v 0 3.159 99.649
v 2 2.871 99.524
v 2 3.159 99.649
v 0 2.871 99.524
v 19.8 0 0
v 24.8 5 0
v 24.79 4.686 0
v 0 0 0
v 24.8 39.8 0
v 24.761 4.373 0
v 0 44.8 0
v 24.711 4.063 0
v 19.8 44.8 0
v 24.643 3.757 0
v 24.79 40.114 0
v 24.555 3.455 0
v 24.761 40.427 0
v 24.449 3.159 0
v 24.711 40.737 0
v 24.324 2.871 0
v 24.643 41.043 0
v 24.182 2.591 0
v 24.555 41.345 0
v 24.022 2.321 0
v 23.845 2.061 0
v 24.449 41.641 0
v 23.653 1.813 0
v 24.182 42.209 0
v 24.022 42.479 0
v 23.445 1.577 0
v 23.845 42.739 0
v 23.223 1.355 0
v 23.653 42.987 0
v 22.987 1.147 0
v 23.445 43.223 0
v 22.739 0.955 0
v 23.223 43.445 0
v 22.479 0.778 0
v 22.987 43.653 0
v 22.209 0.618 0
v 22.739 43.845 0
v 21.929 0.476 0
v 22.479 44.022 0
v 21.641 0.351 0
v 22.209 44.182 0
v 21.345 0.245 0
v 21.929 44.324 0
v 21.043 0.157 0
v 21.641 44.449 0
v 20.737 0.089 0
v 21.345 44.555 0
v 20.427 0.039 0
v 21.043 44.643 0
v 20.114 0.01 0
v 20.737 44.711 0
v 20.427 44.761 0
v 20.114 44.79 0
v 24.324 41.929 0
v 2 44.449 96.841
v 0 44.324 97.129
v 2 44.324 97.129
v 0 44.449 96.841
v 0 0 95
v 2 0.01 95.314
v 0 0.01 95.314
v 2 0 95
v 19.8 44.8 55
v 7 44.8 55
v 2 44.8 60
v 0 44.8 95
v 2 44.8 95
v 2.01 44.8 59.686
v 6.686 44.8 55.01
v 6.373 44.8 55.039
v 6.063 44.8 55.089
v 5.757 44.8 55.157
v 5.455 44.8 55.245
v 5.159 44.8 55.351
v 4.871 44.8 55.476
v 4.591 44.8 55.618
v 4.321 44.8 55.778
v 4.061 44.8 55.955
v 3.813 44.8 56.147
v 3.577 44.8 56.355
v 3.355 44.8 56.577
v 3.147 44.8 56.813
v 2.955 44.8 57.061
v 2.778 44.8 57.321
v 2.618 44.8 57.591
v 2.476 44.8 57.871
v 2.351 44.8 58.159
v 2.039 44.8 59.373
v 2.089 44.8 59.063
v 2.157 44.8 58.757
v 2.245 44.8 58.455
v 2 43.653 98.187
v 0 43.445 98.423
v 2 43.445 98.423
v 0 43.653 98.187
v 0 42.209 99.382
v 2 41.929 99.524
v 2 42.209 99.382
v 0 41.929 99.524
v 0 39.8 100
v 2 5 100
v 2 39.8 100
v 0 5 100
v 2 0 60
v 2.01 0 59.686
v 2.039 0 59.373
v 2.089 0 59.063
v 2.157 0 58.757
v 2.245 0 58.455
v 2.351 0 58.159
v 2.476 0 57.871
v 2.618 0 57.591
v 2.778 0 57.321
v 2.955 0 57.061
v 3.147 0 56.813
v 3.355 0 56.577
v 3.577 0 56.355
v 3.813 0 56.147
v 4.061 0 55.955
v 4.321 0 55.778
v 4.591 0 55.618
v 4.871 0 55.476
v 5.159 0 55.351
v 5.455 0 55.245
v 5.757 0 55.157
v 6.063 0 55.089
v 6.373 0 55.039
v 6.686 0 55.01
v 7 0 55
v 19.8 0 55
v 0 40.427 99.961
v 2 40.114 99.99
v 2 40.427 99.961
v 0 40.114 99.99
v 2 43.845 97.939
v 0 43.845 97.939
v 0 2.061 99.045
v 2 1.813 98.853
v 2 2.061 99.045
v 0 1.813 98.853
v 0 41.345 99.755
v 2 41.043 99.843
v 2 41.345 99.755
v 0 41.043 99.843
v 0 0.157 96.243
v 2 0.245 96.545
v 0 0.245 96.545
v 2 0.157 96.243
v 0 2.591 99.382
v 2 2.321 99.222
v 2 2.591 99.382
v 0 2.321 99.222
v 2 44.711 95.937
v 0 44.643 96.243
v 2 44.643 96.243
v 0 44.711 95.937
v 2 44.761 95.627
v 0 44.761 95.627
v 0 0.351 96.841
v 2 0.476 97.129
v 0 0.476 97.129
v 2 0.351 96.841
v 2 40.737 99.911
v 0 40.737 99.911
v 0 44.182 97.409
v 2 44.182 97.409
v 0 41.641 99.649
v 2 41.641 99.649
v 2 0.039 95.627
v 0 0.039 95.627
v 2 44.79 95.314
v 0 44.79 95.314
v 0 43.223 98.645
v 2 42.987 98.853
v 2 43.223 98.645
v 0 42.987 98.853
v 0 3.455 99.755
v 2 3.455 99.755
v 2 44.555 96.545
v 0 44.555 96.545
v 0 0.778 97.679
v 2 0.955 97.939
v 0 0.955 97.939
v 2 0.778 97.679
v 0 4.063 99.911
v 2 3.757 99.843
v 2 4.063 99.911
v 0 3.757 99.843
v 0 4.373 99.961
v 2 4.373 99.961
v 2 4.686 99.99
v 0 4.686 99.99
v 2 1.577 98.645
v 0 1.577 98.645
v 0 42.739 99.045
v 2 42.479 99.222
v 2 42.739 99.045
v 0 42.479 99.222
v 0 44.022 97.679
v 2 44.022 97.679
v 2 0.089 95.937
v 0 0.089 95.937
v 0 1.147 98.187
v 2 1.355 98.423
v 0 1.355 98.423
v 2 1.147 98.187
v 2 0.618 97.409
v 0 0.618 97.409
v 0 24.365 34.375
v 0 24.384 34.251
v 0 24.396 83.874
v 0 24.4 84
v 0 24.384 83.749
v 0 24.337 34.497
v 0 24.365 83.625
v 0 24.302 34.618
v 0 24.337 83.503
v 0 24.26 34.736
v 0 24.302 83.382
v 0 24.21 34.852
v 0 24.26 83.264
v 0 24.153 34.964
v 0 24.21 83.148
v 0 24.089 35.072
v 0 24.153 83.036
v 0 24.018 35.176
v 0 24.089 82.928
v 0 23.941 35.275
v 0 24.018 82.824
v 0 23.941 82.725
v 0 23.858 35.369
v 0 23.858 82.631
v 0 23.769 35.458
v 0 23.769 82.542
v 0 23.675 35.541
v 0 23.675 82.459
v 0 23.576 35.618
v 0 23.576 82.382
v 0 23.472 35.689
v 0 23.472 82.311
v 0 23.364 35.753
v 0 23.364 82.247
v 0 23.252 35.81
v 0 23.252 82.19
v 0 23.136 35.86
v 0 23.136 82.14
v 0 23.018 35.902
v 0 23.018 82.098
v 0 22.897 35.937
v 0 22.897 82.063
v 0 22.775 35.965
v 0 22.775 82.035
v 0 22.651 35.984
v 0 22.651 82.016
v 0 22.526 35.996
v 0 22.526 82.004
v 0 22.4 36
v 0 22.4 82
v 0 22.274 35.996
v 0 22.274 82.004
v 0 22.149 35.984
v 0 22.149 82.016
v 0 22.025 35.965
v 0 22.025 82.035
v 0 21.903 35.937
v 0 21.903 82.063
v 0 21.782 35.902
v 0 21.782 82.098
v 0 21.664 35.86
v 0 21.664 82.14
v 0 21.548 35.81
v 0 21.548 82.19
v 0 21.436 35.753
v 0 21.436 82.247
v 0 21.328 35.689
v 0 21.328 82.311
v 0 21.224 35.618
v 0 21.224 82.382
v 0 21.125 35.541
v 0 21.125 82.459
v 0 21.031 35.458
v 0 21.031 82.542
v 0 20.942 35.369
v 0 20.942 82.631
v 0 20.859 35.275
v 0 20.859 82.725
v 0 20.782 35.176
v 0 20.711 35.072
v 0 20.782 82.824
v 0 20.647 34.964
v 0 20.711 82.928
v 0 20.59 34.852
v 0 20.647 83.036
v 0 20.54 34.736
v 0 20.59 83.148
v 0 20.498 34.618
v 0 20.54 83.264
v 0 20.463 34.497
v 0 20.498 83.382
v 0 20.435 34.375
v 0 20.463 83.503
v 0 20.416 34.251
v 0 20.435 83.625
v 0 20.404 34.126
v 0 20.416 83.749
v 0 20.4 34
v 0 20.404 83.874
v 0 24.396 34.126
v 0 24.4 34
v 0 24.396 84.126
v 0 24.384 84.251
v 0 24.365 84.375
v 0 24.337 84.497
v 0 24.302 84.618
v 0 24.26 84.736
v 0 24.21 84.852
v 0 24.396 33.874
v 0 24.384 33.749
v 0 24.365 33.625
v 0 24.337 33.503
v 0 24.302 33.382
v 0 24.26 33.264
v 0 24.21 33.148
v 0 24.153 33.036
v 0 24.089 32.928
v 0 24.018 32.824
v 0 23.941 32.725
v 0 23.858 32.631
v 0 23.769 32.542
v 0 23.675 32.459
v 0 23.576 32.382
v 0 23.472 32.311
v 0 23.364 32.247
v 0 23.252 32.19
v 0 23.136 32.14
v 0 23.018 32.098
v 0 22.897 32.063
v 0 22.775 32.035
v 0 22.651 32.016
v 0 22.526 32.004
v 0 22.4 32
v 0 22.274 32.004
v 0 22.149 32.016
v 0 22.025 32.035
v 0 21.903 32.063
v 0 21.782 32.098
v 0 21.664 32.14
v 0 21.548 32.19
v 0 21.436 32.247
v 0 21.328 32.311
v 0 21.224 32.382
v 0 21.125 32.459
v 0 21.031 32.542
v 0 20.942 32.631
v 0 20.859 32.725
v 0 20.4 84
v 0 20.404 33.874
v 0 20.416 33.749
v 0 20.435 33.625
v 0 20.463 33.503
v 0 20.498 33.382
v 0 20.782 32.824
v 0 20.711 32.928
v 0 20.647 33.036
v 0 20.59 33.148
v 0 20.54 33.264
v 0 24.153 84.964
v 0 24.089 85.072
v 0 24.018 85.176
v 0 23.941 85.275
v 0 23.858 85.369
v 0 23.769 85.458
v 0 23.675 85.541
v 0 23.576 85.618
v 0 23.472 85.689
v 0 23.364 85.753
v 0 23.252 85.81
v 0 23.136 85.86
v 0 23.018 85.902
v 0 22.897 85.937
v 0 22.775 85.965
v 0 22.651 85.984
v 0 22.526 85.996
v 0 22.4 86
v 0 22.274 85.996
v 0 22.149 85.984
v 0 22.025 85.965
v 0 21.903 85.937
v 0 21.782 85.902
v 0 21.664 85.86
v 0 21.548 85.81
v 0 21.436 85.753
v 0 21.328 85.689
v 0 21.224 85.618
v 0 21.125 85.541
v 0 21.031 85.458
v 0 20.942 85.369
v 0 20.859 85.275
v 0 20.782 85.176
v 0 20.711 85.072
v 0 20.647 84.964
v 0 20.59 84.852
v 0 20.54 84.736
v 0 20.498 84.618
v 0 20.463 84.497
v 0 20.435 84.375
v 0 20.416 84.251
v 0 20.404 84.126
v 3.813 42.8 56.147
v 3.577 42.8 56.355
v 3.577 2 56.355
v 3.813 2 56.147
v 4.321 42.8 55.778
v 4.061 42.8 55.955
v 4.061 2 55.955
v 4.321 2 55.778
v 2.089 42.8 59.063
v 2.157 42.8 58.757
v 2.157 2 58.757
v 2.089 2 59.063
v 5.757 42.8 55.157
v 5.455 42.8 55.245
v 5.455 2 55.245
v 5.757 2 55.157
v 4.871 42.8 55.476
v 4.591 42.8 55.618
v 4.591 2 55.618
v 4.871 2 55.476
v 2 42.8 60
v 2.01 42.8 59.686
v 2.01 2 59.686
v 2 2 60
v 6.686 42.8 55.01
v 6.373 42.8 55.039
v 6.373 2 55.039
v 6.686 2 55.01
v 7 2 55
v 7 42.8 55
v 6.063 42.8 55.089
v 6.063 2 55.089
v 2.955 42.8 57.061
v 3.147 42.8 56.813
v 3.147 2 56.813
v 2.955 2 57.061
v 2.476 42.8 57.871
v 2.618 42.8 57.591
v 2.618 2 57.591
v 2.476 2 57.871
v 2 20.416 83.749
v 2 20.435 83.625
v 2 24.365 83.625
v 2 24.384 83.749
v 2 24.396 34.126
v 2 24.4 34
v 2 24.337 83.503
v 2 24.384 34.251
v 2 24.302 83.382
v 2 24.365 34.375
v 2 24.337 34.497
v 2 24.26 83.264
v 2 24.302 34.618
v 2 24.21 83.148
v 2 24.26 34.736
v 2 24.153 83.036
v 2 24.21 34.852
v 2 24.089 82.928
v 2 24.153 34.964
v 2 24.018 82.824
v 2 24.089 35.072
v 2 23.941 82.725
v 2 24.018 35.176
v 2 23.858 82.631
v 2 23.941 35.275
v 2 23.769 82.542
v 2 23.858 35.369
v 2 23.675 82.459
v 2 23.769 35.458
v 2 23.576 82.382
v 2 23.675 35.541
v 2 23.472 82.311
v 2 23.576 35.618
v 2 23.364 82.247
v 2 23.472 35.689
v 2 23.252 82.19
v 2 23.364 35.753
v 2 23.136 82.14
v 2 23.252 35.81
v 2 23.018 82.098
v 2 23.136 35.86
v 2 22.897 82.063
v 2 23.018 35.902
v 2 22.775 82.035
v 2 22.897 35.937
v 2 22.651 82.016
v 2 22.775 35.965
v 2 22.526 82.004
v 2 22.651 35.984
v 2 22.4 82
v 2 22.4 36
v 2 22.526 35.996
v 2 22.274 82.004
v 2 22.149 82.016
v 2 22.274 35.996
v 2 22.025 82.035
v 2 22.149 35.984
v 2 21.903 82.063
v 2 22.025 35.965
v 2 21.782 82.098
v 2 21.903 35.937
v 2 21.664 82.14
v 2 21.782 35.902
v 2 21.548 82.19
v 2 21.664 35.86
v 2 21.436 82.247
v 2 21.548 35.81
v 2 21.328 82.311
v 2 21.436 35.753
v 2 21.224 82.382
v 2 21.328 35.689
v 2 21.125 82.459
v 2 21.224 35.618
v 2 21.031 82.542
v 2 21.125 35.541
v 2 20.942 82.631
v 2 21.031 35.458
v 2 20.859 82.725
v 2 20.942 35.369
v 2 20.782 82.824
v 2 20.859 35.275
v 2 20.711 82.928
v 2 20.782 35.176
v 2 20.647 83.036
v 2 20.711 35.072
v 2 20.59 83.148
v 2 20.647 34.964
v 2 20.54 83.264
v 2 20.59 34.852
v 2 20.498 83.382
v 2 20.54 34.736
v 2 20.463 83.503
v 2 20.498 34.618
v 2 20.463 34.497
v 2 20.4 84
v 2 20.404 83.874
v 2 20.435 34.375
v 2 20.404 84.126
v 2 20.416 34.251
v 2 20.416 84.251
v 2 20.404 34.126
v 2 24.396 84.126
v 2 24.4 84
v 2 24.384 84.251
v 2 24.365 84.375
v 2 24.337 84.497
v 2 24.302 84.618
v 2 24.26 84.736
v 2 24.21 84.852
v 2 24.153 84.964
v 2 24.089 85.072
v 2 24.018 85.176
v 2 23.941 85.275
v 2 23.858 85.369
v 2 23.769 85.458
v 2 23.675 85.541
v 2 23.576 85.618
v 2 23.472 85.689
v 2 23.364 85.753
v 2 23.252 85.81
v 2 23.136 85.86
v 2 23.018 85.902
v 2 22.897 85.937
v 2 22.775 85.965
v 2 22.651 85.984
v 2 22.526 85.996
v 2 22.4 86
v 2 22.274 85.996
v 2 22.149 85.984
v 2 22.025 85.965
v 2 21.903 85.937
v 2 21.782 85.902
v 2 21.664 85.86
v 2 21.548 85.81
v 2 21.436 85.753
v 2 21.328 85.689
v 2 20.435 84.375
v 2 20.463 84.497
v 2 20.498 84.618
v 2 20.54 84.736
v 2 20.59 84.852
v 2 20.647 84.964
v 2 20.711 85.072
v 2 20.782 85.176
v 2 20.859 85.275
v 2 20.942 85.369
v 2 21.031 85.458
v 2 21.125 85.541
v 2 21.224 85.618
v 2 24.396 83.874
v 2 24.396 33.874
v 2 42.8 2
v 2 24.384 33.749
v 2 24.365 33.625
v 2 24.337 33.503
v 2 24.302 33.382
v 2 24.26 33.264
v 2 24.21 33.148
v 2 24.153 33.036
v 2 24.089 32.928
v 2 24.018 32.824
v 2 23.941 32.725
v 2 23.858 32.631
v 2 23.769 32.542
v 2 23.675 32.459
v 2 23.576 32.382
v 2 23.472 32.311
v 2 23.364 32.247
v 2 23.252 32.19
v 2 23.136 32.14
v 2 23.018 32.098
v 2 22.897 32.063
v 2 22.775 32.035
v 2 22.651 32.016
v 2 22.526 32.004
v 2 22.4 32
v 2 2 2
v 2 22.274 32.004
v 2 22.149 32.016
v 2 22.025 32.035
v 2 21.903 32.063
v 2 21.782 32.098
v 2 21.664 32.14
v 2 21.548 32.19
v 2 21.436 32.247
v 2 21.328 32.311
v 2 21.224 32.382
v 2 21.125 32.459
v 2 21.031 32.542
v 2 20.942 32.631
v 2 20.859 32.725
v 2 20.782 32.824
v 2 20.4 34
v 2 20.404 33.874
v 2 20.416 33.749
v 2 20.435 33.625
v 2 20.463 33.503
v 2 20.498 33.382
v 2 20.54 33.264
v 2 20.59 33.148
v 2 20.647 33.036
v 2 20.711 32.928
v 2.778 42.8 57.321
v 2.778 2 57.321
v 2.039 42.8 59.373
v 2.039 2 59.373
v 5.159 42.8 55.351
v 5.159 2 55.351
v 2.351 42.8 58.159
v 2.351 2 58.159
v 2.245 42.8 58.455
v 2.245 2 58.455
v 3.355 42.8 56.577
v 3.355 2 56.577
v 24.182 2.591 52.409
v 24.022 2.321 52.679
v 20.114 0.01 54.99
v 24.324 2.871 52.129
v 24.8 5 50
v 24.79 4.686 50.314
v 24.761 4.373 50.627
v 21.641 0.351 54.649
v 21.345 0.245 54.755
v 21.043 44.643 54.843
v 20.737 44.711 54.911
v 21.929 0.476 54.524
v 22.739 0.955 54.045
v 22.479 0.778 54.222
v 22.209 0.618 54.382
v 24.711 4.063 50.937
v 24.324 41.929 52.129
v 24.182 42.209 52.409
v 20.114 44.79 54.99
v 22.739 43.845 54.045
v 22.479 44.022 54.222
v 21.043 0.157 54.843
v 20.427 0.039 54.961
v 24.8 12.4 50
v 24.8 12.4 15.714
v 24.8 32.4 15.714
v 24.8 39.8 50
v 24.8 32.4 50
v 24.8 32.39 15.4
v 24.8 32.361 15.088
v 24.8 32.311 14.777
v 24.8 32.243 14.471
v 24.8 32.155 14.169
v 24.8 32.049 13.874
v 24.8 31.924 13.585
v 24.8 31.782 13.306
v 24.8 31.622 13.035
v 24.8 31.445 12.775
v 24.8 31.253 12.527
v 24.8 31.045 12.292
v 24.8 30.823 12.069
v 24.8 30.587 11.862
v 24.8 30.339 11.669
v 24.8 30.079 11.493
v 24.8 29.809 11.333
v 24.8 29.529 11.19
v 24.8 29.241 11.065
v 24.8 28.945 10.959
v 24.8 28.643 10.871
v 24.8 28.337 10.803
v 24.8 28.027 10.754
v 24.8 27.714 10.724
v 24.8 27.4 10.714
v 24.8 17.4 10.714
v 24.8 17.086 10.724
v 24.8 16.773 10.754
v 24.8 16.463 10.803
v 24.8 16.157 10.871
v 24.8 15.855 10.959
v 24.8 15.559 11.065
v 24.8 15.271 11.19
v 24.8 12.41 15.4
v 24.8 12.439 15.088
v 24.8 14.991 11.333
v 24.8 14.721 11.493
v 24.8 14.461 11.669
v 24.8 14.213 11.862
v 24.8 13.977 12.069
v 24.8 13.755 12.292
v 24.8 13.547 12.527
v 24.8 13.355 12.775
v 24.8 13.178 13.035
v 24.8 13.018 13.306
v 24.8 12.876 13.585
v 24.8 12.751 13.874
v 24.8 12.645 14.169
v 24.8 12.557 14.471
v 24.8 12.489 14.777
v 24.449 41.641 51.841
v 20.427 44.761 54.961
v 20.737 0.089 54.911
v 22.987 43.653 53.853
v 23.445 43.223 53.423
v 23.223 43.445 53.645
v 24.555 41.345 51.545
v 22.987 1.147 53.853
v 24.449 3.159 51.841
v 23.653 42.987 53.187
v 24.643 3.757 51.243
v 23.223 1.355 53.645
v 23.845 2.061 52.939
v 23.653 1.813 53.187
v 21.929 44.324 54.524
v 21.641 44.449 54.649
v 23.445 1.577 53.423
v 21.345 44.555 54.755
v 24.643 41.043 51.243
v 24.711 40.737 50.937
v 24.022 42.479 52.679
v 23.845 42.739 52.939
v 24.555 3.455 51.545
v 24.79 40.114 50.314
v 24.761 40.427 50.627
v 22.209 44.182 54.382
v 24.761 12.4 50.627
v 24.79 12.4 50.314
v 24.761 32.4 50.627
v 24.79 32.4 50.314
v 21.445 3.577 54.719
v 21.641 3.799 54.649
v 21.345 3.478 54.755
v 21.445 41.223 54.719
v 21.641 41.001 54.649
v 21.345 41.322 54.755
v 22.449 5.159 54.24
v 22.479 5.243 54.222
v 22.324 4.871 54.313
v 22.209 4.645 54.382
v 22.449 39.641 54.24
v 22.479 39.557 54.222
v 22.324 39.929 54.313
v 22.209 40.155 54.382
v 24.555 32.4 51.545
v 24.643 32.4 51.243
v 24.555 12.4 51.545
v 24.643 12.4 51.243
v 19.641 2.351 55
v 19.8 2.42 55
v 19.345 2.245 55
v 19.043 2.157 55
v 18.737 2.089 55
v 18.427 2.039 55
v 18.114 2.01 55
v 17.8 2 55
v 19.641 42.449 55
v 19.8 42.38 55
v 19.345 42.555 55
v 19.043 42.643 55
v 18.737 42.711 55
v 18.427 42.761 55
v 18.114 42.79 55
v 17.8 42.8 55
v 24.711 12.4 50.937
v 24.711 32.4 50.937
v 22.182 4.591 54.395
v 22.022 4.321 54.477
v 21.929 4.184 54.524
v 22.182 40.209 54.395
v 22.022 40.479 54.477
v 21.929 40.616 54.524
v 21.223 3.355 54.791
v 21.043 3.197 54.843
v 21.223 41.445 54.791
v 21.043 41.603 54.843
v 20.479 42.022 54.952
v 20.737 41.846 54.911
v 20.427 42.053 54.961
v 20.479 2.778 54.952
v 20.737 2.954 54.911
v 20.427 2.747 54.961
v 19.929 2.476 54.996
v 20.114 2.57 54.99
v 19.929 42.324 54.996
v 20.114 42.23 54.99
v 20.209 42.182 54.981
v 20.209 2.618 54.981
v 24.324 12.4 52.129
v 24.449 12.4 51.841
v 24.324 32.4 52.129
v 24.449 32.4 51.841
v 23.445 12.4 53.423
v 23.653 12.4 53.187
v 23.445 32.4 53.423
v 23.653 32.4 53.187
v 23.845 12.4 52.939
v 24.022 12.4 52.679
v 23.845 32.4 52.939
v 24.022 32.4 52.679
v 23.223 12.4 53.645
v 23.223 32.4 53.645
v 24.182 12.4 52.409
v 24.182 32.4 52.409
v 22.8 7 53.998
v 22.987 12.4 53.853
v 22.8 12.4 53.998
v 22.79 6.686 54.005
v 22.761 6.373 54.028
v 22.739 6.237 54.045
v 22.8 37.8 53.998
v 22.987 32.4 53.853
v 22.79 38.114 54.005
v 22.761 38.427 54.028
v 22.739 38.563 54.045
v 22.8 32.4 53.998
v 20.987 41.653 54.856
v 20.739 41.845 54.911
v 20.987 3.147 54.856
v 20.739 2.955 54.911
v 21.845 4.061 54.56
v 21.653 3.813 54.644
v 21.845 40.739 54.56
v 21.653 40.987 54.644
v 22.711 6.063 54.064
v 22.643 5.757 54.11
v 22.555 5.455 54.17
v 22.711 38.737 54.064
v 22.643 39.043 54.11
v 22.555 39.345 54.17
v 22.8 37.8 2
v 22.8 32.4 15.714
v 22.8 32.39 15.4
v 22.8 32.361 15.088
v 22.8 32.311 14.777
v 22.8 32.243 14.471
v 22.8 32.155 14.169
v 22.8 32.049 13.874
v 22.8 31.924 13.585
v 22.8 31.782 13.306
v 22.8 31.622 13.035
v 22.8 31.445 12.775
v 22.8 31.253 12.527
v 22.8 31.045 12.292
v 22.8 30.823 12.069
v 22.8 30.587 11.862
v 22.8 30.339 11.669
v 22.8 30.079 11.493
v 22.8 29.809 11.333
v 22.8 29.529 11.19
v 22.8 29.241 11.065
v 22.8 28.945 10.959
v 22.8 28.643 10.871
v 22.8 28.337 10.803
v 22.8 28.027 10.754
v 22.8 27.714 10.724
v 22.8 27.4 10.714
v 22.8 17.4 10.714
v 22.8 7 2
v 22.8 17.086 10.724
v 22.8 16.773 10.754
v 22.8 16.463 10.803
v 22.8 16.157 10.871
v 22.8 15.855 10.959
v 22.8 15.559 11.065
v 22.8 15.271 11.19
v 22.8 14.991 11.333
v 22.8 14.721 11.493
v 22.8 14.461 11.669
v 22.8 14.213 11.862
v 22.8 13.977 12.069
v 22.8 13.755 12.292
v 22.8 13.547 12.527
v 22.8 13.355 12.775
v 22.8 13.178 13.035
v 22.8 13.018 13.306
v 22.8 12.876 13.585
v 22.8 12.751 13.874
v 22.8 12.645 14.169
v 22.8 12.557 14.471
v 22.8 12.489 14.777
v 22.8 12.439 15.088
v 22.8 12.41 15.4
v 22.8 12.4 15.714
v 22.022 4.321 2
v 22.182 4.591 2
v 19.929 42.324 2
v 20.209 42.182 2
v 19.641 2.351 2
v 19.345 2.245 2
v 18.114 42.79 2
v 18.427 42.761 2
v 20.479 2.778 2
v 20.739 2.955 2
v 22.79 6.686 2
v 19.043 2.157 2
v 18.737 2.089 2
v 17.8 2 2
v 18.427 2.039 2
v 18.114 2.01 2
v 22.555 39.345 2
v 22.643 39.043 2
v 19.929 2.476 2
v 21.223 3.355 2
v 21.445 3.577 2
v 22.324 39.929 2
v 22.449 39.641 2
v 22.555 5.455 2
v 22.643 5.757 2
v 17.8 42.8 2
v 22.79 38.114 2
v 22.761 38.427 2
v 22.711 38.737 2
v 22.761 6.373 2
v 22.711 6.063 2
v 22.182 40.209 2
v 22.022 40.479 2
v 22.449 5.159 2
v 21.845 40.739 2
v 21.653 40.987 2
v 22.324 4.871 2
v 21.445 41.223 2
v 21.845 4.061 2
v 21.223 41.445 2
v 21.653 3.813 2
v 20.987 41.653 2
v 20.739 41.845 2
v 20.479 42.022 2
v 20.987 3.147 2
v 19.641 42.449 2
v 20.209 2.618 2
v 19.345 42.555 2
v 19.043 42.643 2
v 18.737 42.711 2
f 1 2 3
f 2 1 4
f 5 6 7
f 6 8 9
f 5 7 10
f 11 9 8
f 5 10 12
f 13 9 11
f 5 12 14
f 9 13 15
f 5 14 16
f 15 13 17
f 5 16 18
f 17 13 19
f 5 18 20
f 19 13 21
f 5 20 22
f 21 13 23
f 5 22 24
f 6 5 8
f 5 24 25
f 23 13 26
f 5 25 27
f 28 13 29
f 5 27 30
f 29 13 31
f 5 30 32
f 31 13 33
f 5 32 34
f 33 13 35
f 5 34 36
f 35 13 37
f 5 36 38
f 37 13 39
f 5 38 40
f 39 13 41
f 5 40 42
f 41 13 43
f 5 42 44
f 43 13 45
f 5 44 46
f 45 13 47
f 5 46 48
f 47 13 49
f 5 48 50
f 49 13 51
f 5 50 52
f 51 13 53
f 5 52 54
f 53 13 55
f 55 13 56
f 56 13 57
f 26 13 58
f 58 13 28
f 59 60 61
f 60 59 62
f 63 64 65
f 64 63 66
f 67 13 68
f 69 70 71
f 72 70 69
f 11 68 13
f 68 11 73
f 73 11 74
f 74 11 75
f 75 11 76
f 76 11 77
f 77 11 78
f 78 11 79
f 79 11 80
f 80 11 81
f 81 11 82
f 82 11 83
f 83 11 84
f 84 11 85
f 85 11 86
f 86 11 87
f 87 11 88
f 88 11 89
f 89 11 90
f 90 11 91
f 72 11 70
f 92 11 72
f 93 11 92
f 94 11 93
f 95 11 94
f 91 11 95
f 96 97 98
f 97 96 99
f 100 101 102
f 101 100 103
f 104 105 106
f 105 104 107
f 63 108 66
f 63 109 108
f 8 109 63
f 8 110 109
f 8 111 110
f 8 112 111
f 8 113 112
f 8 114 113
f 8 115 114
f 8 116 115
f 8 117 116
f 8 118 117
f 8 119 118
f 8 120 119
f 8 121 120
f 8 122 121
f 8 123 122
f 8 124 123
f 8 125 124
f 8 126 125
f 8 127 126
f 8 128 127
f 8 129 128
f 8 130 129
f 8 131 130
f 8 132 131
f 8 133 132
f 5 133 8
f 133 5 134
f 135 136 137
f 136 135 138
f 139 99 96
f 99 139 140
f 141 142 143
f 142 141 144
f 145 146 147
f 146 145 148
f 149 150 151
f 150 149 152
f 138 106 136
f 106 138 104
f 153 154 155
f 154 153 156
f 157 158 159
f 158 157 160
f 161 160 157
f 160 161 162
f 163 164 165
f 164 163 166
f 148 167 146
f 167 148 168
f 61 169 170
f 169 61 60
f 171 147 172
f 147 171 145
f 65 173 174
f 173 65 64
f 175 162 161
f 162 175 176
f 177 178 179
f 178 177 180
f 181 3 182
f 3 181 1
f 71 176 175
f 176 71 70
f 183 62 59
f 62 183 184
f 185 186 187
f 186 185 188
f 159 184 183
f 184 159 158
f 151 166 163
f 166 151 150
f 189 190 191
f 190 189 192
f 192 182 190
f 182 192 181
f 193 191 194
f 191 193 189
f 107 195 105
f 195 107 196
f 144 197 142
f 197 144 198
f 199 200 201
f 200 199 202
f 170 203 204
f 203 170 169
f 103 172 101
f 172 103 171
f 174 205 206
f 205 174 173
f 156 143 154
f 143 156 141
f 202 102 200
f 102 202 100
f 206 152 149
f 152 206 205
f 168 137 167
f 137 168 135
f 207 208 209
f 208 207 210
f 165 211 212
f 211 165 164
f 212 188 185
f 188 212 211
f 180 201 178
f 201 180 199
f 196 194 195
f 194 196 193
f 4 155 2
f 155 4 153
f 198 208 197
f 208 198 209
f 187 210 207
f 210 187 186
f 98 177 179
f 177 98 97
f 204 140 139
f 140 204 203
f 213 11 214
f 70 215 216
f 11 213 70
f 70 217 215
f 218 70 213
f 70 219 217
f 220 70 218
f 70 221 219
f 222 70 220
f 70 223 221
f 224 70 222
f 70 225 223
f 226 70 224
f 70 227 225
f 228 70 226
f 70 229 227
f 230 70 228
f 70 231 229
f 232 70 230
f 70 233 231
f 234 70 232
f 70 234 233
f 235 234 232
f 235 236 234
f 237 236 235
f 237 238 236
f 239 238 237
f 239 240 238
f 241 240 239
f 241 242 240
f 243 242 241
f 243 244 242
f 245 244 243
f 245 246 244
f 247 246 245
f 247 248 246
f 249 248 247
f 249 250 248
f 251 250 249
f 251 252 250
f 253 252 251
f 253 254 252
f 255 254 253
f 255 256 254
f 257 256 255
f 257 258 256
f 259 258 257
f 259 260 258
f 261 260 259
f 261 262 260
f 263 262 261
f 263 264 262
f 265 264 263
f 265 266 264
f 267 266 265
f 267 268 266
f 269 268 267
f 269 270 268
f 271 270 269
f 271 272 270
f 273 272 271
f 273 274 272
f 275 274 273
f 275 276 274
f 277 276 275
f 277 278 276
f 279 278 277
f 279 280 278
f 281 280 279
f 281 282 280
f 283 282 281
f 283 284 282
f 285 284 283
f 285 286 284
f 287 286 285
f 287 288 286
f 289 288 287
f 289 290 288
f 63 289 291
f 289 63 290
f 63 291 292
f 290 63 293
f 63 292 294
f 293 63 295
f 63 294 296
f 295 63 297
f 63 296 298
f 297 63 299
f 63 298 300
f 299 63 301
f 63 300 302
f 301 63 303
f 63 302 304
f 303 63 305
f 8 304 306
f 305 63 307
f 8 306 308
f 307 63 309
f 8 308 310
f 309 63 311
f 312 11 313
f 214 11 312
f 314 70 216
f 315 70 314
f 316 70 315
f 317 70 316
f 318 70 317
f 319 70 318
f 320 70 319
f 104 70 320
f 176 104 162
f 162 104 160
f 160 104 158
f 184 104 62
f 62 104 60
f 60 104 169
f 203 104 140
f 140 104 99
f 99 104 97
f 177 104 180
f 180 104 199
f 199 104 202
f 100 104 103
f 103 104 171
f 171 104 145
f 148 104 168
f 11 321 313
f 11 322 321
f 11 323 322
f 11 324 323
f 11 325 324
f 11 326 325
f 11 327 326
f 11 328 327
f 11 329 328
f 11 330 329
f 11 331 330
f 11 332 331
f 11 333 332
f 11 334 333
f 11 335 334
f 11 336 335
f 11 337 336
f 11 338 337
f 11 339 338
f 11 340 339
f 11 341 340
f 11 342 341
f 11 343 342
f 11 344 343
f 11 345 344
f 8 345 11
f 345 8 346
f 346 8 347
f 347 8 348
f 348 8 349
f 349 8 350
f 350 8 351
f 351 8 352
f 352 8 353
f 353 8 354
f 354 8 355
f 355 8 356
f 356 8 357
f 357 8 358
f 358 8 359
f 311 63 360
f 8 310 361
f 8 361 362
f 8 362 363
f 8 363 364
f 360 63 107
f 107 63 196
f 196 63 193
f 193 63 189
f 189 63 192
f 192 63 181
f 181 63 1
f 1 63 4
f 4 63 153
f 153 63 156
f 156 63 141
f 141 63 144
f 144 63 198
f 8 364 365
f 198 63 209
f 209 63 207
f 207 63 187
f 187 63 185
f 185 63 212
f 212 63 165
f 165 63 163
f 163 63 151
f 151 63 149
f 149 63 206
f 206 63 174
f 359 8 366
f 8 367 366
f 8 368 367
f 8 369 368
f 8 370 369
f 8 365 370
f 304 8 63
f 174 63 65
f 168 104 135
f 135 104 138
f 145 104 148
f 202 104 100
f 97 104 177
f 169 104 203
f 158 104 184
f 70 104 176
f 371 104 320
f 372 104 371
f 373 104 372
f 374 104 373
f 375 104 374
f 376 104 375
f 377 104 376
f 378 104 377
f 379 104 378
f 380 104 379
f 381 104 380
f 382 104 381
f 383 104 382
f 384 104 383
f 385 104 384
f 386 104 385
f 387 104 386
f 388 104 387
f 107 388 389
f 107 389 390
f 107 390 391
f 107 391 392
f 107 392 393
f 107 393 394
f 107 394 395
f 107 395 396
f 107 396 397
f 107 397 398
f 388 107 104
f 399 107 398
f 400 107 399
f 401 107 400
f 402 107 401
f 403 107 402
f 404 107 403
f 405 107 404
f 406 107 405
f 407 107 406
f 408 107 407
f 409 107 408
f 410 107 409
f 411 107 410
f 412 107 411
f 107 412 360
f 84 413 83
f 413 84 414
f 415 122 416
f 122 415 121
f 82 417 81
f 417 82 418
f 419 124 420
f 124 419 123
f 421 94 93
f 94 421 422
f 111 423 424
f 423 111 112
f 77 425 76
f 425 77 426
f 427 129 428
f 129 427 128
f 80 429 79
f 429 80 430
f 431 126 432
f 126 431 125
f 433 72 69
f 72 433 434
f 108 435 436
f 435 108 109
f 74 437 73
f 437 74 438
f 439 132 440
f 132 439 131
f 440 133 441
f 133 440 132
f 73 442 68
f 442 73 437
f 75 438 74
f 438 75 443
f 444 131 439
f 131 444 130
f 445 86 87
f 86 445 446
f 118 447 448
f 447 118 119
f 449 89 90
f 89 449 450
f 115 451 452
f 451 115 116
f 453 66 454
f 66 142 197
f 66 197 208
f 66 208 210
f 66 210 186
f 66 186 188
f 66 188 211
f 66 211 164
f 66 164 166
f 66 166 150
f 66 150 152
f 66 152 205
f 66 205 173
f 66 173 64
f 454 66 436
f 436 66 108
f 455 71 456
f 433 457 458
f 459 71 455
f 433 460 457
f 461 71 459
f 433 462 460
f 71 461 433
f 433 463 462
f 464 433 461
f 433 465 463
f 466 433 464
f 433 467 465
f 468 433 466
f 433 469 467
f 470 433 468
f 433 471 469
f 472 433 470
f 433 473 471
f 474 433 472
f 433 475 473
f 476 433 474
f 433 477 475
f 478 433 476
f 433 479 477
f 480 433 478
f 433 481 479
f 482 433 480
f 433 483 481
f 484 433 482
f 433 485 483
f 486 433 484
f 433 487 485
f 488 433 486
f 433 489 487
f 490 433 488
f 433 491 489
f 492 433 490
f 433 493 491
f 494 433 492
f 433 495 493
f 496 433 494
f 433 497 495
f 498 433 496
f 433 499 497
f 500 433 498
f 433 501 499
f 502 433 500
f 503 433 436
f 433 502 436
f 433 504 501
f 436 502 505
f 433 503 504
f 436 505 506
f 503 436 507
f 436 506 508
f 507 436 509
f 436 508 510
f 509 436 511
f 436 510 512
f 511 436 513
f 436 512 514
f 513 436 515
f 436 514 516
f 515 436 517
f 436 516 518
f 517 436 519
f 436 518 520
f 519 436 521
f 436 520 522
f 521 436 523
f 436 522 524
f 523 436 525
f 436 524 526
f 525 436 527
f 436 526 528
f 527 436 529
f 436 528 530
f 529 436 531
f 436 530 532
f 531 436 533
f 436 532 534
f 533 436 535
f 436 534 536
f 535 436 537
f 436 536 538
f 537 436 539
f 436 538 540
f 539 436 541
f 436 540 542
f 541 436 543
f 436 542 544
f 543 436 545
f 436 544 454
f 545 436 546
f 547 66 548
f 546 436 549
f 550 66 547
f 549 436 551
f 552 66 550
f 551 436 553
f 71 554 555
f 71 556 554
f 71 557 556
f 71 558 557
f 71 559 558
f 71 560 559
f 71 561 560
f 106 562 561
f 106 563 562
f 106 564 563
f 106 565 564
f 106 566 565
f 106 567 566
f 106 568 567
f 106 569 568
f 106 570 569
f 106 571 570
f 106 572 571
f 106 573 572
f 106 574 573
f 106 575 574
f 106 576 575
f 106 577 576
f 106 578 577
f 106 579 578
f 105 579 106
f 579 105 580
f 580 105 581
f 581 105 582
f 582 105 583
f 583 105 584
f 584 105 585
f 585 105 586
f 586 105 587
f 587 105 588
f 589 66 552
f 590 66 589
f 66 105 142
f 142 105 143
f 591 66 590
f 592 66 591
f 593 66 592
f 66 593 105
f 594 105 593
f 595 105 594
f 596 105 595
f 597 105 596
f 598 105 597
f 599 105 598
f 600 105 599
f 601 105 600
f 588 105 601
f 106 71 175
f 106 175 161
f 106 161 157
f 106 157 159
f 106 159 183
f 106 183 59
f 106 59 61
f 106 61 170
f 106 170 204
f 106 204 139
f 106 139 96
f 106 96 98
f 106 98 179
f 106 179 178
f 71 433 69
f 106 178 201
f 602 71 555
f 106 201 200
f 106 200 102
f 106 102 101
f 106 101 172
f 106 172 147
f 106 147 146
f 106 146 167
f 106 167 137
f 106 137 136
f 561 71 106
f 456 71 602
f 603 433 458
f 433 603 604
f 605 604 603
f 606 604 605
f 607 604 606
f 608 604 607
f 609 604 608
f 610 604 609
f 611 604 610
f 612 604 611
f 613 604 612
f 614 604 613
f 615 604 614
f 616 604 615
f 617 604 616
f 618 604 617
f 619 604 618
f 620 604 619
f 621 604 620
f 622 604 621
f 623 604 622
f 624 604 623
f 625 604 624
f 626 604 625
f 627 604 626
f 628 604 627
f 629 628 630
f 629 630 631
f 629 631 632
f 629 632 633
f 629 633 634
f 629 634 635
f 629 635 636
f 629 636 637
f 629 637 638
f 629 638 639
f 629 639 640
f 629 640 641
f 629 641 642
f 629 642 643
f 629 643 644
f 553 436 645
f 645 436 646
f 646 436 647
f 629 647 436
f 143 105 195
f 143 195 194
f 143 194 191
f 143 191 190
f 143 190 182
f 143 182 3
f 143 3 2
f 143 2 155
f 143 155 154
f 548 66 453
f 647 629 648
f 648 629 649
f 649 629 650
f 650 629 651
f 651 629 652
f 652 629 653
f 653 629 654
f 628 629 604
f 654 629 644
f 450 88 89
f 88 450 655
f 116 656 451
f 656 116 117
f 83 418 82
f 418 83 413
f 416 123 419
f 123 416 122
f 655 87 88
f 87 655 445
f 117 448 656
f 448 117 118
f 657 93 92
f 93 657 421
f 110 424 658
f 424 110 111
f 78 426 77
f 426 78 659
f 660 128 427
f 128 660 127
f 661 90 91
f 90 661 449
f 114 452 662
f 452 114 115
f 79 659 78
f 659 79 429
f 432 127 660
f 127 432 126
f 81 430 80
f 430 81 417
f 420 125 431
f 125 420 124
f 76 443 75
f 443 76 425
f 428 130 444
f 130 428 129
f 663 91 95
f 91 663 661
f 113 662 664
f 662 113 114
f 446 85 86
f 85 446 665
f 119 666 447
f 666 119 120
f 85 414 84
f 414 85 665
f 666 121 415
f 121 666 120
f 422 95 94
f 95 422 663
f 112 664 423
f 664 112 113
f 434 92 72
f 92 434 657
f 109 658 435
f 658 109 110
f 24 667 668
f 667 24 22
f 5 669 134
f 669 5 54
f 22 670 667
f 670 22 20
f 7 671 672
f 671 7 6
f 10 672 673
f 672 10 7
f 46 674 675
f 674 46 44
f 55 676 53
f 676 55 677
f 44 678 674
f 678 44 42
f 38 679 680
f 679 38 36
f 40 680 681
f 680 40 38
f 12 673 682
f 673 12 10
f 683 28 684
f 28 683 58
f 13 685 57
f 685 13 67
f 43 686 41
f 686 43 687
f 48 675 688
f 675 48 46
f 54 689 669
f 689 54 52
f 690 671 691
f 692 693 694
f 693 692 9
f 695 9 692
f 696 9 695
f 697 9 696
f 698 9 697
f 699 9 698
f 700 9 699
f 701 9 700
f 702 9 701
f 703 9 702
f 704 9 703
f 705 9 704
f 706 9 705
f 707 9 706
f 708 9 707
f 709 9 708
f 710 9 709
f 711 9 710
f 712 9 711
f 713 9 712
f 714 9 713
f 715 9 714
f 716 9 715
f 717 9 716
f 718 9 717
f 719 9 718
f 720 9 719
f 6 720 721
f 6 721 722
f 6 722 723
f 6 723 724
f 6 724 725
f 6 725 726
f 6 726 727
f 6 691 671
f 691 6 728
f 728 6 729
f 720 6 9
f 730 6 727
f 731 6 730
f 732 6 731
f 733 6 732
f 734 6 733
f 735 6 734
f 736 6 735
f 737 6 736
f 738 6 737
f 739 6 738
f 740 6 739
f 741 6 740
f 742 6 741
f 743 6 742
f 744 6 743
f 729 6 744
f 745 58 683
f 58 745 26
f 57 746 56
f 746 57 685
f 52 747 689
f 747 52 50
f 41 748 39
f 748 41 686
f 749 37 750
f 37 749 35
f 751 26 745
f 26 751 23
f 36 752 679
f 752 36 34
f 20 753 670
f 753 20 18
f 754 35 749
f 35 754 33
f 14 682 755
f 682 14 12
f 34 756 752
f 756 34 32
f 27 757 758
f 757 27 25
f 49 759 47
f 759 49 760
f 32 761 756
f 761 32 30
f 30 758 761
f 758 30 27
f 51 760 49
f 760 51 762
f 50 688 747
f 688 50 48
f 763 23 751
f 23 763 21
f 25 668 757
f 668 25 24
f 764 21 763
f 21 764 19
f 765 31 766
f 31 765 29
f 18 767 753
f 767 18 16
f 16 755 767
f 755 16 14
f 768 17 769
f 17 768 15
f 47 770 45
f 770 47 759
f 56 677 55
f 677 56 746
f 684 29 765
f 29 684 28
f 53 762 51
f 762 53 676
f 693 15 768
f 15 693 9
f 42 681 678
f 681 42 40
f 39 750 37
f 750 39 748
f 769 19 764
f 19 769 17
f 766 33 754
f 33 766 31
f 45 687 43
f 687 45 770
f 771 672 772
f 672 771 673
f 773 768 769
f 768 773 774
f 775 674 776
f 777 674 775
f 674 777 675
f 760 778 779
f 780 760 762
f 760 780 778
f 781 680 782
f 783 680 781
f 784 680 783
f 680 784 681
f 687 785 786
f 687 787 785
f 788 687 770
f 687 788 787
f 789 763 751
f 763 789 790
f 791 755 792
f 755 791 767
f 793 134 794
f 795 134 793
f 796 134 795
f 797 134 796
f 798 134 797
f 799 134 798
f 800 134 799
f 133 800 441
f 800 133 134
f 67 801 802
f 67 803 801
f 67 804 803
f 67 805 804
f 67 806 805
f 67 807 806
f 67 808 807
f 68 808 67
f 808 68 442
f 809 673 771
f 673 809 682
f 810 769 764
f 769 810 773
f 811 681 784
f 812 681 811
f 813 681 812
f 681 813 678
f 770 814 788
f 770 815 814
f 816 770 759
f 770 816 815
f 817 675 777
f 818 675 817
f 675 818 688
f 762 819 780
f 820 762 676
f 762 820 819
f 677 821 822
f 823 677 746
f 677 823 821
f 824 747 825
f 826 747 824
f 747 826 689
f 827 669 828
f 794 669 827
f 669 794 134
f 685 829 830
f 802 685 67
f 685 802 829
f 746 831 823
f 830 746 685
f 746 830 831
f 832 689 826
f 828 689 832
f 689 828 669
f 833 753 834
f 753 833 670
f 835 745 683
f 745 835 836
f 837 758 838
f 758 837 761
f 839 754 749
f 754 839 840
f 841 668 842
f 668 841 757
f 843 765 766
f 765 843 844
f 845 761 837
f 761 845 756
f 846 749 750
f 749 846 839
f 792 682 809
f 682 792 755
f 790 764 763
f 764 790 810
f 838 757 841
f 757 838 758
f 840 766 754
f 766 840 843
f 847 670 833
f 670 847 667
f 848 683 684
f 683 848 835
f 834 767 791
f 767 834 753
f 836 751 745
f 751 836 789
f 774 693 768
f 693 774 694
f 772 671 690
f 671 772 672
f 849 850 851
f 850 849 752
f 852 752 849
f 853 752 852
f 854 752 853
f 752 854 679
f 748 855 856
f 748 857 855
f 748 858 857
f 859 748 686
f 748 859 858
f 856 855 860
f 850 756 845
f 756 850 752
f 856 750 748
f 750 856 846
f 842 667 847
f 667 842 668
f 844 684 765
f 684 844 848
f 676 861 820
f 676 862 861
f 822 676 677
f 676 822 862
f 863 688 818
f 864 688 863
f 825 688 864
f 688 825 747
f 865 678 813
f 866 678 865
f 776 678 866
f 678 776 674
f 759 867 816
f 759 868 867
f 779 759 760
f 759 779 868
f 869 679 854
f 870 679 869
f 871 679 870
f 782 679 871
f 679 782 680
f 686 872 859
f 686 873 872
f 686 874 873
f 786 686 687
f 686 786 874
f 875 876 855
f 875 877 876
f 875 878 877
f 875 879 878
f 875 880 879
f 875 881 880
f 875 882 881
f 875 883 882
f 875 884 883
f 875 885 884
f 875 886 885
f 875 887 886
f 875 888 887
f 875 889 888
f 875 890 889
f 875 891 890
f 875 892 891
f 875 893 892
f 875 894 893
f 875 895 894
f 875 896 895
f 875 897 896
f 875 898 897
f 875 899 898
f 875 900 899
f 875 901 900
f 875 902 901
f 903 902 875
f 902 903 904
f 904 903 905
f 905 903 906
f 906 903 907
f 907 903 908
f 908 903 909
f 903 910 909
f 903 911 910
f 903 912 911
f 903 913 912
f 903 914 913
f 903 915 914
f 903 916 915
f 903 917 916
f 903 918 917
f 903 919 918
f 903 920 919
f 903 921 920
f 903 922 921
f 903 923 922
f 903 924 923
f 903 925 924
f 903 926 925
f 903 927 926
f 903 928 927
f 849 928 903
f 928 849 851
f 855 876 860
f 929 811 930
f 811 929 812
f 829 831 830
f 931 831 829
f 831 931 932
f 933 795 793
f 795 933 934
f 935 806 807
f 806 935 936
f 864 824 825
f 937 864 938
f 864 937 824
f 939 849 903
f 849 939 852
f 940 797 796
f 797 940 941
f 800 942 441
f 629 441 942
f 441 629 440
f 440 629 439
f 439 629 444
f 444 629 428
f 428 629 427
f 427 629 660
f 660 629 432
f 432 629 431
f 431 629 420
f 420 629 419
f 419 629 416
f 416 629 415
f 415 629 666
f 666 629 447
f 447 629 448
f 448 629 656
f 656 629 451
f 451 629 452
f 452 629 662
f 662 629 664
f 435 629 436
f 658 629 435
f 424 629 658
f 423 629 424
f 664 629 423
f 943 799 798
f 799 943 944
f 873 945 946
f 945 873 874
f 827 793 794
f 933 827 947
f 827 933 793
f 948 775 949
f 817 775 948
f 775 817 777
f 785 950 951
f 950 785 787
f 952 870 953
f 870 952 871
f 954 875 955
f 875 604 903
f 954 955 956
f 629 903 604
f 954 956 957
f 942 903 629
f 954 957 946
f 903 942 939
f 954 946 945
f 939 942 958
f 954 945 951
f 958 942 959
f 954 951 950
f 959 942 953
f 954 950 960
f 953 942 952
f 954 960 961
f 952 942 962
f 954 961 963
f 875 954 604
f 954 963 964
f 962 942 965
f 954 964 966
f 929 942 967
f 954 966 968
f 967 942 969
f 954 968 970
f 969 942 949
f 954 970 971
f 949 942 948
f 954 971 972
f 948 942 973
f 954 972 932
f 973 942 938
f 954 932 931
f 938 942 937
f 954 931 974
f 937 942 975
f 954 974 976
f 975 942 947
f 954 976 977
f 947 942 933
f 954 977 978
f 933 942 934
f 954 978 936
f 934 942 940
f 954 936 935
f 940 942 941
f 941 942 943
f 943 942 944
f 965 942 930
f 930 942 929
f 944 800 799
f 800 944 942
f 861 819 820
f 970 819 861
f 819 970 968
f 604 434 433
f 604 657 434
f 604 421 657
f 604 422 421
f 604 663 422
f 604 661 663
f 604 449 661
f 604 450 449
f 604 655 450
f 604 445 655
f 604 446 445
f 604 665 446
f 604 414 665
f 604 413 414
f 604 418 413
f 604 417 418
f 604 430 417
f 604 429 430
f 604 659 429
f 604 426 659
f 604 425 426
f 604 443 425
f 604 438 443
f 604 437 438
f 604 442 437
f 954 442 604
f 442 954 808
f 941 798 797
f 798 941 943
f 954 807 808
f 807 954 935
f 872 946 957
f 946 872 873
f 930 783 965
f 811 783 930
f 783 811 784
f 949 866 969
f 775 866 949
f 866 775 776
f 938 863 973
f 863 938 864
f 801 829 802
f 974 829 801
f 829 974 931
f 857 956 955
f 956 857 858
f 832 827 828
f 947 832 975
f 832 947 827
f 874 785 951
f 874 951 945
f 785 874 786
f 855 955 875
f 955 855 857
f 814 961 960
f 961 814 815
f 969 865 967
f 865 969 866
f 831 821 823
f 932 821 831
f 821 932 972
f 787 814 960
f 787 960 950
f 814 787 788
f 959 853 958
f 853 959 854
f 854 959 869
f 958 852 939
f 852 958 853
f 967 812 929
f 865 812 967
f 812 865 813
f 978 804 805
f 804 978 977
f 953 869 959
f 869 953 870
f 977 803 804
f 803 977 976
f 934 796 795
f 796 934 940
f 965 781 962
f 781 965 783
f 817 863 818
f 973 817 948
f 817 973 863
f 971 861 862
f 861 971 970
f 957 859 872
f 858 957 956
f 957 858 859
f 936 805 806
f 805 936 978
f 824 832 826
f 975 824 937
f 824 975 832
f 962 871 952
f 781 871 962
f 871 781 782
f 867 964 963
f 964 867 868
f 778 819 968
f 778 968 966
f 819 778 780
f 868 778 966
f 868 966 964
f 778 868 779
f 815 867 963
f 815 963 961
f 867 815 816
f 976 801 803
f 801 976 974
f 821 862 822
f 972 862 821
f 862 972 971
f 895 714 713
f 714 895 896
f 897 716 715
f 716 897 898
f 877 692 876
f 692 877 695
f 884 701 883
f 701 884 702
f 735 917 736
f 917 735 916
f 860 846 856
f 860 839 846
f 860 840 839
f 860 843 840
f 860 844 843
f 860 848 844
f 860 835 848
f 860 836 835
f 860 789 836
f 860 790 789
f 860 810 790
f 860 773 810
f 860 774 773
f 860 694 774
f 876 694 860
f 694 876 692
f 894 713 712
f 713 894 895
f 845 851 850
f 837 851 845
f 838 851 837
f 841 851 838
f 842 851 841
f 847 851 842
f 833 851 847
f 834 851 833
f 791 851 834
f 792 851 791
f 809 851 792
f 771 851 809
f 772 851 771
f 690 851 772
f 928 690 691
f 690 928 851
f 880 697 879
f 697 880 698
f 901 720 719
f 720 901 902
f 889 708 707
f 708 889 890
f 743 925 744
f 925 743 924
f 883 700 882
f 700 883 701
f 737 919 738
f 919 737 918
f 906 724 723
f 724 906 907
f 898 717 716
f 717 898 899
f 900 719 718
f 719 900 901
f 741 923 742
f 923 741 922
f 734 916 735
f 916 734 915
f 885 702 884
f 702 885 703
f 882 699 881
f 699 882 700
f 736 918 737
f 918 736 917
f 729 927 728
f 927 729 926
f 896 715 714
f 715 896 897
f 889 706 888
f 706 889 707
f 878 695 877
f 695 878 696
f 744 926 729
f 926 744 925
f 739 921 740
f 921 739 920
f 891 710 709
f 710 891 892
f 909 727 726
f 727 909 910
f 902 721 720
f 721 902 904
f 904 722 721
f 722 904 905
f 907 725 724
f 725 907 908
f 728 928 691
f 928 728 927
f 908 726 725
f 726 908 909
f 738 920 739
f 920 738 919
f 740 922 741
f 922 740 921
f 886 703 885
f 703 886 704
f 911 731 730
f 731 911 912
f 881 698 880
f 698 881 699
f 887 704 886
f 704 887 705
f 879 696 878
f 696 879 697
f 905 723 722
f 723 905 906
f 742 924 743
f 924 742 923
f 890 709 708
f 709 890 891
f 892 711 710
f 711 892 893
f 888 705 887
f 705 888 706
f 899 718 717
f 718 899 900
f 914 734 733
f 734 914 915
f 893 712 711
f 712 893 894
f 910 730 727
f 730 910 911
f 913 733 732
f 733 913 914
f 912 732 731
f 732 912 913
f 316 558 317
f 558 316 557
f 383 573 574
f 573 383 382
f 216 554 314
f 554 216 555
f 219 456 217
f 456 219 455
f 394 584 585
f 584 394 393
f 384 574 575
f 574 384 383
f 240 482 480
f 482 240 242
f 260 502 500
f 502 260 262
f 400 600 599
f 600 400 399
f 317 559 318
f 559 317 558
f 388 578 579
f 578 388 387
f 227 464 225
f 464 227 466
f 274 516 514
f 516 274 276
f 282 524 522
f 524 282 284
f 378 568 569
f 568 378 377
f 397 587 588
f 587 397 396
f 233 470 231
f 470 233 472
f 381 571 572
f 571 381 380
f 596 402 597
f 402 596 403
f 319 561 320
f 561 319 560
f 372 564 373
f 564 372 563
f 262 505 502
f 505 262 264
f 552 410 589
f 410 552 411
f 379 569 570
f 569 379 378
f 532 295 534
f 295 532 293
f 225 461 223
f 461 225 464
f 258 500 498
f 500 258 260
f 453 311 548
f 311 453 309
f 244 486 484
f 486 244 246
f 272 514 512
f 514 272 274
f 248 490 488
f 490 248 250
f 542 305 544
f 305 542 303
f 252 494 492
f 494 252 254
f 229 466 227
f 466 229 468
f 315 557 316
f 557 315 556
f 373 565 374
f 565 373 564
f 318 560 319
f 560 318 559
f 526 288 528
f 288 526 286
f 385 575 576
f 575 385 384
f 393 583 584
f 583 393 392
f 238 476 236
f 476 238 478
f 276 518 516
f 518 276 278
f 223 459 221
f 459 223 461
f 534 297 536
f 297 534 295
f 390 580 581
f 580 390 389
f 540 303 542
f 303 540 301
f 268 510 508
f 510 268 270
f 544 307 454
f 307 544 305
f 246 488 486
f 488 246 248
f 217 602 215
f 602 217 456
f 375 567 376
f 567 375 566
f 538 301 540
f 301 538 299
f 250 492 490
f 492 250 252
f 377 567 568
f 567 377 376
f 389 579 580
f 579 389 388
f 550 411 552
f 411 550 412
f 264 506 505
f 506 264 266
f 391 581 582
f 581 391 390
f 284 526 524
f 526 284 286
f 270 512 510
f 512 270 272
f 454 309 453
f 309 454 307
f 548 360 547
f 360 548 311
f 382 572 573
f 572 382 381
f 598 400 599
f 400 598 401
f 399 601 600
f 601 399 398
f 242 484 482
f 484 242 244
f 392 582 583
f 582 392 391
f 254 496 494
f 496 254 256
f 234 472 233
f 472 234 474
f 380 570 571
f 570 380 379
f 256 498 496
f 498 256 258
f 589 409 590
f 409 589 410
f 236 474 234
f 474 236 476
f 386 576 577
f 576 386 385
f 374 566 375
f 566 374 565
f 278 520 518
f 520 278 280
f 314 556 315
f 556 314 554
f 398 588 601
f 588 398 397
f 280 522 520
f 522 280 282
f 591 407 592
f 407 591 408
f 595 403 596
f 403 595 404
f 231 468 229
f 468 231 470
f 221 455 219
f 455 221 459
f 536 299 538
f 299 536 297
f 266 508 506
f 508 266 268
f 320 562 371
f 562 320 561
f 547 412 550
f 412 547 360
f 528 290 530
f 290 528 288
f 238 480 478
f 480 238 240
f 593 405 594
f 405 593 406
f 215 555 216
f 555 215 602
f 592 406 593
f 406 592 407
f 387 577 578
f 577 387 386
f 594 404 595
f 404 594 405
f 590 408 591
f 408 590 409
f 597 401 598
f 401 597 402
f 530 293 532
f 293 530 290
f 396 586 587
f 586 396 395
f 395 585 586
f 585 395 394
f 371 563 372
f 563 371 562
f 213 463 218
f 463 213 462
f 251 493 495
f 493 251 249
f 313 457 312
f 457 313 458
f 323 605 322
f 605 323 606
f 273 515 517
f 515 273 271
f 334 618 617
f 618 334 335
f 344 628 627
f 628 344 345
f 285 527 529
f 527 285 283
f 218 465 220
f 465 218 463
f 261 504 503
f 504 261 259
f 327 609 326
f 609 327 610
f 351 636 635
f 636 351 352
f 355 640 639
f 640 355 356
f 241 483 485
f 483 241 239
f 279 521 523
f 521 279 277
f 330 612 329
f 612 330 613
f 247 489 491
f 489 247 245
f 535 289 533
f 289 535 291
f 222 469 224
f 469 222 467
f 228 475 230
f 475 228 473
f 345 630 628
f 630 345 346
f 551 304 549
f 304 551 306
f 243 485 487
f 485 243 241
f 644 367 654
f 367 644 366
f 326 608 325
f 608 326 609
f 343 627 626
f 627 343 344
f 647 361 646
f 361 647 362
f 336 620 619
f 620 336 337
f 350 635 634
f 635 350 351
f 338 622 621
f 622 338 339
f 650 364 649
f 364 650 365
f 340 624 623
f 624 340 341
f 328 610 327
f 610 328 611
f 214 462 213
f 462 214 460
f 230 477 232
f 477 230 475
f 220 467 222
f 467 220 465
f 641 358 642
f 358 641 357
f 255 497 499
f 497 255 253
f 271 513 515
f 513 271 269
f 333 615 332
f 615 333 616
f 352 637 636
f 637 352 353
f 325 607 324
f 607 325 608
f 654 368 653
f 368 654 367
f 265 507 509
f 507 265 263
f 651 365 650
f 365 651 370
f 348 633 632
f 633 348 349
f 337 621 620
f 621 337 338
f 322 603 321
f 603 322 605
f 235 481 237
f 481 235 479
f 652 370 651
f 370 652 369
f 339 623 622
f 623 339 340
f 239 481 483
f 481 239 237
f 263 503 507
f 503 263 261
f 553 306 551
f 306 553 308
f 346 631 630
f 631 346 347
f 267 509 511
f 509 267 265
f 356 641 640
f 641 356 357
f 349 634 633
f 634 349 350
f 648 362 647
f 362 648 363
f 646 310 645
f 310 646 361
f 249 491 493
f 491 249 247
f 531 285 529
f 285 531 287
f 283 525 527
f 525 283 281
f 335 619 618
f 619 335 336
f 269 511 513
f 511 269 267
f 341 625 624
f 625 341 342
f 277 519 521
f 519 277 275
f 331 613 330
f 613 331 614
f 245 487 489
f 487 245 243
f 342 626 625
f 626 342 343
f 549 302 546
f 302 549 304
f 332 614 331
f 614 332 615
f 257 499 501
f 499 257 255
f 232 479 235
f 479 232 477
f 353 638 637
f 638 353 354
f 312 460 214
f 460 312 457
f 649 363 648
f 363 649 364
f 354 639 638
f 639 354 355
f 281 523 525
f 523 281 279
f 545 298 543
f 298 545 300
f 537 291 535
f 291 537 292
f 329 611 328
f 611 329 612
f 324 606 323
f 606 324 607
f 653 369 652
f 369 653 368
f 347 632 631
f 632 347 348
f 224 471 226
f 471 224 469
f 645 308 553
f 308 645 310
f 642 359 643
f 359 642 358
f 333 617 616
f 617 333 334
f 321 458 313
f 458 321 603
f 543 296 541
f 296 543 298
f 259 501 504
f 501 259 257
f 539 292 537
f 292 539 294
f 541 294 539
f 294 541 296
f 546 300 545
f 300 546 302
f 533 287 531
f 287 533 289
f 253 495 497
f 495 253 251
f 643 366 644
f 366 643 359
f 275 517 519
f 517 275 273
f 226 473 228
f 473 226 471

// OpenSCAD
/* [Support Info] */

// Width of printed wall. Take into account that in the insertion this will be half of the value inserted (mm)
wall_width = 2; // 0.1

// Sice of the remote (depth, width and height (mm)
remote_size = [20, 40, 150];

// Rounding radius (mm)
rounding = 5;

// Screw metriz size (diam) (mm)
screw_metric = 4;

/* [Printer settings] */
// Printer tolerance. Printers are not perfect, pieces need a bit of margin to fit. (mm)
tolerance = 0.4;

/* [Other] */

// Small cuantity to ensure cutting though
epsilon = 0.1;

// $fn resolution
fn = 100;



module rounded_cylinder(h,r)
{
    // translate(v = [rounding,rounding,0]) 
    union()
    {
        sphere(r = r, $fn = fn);
        translate([0,0,-h+r])
        cylinder(h = h-r, r = r, $fn = fn);
    }
}

module circled_square(x,y,z,r)
{
    linear_extrude(z)
    {
        hull()
        {
            square([x-r,y]);
            translate([x-r,r])
            circle(r, $fn = fn);
            translate([x-r,y-r])
            circle(r, $fn = fn);
        }
    }
}

module rounded_shape(dimensions, r_round)
{
    translate([dimensions[0]-rounding, dimensions[1]-rounding, dimensions[2]-rounding])
    rotate([0,0,180])
    hull()
    {
        translate(v = [0,-r_round,-dimensions[2]+r_round]) 
        cube(size = [dimensions[0]-r_round, dimensions[1], dimensions[2]-r_round]);
        
        translate([0,dimensions[1]-r_round*2,0])
        rounded_cylinder(dimensions[2],r_round);    
        rounded_cylinder(dimensions[2],r_round);

        rotate([0,-90,0])
        union()
        {
            translate([0,dimensions[1]-r_round*2,0])
            rounded_cylinder(dimensions[0],r_round);    
            rounded_cylinder(dimensions[0],r_round);
        }
        
    }
}



module box_base(dimensions, wall_w, r_round)
{   
    extra_wall = wall_w + tolerance;

    difference() 
    {
        union()
        {
            difference()
            {
                translate([wall_w+r_round,0,0])
                rotate([0,-90,0])
                circled_square(dimensions[2]*2/3,dimensions[1]+extra_wall*2,wall_w+r_round,r_round);

                translate([dimensions[0]+extra_wall*2+wall_w,-epsilon,dimensions[2]*2/5-r_round])
                rotate([90,0,180])
                circled_square(dimensions[0]+extra_wall*2,dimensions[1]*2+extra_wall*2,dimensions[1]+extra_wall*2+epsilon*2,r_round);   
            }
            intersection() 
            {
                circled_square(dimensions[0]+extra_wall*2,dimensions[1]+extra_wall*2,dimensions[2]*2/5,r_round);
                translate([wall_w,0,0])
            
                translate(v = [-wall_width,dimensions[1]*1.5,-r_round]) 
                rotate([90,0,0])
                circled_square(dimensions[0]+extra_wall*2,dimensions[2]*2/5,dimensions[1]*2,r_round);
            }
        }
        translate(v = [wall_w, wall_w, wall_w]) 
        circled_square(dimensions[0]+tolerance*2,dimensions[1]+tolerance*2,dimensions[2]+tolerance*2,r_round);
    
        y_translate = (dimensions[1] + extra_wall*2 - dimensions[1]*2/4)/2;
        translate(v = [dimensions[0], y_translate,dimensions[2]+dimensions[2]*1/14]) 
        rotate([0,90,0])
        circled_square(dimensions[2],dimensions[1]*2/4,wall_w*3,r_round);
    
        translate(v = [-epsilon,(dimensions[1] + extra_wall*2)/2,dimensions[2]*2/3-wall_w*8]) 
        rotate([0,90,0])
        cylinder(h = wall_w*3, d = screw_metric, $fn = fn);

        translate(v = [-epsilon,(dimensions[1] + extra_wall*2)/2,dimensions[2]*1/3-wall_w*8]) 
        rotate([0,90,0])
        cylinder(h = wall_w*3, d = screw_metric, $fn = fn);
    } 
}       


// translate([wall_width+tolerance,wall_width+tolerance,wall_width+tolerance])
// color("Indigo", alpha = 0.6)
// cube(remote_size);
box_base(dimensions = remote_size, wall_w = wall_width, r_round = rounding);
